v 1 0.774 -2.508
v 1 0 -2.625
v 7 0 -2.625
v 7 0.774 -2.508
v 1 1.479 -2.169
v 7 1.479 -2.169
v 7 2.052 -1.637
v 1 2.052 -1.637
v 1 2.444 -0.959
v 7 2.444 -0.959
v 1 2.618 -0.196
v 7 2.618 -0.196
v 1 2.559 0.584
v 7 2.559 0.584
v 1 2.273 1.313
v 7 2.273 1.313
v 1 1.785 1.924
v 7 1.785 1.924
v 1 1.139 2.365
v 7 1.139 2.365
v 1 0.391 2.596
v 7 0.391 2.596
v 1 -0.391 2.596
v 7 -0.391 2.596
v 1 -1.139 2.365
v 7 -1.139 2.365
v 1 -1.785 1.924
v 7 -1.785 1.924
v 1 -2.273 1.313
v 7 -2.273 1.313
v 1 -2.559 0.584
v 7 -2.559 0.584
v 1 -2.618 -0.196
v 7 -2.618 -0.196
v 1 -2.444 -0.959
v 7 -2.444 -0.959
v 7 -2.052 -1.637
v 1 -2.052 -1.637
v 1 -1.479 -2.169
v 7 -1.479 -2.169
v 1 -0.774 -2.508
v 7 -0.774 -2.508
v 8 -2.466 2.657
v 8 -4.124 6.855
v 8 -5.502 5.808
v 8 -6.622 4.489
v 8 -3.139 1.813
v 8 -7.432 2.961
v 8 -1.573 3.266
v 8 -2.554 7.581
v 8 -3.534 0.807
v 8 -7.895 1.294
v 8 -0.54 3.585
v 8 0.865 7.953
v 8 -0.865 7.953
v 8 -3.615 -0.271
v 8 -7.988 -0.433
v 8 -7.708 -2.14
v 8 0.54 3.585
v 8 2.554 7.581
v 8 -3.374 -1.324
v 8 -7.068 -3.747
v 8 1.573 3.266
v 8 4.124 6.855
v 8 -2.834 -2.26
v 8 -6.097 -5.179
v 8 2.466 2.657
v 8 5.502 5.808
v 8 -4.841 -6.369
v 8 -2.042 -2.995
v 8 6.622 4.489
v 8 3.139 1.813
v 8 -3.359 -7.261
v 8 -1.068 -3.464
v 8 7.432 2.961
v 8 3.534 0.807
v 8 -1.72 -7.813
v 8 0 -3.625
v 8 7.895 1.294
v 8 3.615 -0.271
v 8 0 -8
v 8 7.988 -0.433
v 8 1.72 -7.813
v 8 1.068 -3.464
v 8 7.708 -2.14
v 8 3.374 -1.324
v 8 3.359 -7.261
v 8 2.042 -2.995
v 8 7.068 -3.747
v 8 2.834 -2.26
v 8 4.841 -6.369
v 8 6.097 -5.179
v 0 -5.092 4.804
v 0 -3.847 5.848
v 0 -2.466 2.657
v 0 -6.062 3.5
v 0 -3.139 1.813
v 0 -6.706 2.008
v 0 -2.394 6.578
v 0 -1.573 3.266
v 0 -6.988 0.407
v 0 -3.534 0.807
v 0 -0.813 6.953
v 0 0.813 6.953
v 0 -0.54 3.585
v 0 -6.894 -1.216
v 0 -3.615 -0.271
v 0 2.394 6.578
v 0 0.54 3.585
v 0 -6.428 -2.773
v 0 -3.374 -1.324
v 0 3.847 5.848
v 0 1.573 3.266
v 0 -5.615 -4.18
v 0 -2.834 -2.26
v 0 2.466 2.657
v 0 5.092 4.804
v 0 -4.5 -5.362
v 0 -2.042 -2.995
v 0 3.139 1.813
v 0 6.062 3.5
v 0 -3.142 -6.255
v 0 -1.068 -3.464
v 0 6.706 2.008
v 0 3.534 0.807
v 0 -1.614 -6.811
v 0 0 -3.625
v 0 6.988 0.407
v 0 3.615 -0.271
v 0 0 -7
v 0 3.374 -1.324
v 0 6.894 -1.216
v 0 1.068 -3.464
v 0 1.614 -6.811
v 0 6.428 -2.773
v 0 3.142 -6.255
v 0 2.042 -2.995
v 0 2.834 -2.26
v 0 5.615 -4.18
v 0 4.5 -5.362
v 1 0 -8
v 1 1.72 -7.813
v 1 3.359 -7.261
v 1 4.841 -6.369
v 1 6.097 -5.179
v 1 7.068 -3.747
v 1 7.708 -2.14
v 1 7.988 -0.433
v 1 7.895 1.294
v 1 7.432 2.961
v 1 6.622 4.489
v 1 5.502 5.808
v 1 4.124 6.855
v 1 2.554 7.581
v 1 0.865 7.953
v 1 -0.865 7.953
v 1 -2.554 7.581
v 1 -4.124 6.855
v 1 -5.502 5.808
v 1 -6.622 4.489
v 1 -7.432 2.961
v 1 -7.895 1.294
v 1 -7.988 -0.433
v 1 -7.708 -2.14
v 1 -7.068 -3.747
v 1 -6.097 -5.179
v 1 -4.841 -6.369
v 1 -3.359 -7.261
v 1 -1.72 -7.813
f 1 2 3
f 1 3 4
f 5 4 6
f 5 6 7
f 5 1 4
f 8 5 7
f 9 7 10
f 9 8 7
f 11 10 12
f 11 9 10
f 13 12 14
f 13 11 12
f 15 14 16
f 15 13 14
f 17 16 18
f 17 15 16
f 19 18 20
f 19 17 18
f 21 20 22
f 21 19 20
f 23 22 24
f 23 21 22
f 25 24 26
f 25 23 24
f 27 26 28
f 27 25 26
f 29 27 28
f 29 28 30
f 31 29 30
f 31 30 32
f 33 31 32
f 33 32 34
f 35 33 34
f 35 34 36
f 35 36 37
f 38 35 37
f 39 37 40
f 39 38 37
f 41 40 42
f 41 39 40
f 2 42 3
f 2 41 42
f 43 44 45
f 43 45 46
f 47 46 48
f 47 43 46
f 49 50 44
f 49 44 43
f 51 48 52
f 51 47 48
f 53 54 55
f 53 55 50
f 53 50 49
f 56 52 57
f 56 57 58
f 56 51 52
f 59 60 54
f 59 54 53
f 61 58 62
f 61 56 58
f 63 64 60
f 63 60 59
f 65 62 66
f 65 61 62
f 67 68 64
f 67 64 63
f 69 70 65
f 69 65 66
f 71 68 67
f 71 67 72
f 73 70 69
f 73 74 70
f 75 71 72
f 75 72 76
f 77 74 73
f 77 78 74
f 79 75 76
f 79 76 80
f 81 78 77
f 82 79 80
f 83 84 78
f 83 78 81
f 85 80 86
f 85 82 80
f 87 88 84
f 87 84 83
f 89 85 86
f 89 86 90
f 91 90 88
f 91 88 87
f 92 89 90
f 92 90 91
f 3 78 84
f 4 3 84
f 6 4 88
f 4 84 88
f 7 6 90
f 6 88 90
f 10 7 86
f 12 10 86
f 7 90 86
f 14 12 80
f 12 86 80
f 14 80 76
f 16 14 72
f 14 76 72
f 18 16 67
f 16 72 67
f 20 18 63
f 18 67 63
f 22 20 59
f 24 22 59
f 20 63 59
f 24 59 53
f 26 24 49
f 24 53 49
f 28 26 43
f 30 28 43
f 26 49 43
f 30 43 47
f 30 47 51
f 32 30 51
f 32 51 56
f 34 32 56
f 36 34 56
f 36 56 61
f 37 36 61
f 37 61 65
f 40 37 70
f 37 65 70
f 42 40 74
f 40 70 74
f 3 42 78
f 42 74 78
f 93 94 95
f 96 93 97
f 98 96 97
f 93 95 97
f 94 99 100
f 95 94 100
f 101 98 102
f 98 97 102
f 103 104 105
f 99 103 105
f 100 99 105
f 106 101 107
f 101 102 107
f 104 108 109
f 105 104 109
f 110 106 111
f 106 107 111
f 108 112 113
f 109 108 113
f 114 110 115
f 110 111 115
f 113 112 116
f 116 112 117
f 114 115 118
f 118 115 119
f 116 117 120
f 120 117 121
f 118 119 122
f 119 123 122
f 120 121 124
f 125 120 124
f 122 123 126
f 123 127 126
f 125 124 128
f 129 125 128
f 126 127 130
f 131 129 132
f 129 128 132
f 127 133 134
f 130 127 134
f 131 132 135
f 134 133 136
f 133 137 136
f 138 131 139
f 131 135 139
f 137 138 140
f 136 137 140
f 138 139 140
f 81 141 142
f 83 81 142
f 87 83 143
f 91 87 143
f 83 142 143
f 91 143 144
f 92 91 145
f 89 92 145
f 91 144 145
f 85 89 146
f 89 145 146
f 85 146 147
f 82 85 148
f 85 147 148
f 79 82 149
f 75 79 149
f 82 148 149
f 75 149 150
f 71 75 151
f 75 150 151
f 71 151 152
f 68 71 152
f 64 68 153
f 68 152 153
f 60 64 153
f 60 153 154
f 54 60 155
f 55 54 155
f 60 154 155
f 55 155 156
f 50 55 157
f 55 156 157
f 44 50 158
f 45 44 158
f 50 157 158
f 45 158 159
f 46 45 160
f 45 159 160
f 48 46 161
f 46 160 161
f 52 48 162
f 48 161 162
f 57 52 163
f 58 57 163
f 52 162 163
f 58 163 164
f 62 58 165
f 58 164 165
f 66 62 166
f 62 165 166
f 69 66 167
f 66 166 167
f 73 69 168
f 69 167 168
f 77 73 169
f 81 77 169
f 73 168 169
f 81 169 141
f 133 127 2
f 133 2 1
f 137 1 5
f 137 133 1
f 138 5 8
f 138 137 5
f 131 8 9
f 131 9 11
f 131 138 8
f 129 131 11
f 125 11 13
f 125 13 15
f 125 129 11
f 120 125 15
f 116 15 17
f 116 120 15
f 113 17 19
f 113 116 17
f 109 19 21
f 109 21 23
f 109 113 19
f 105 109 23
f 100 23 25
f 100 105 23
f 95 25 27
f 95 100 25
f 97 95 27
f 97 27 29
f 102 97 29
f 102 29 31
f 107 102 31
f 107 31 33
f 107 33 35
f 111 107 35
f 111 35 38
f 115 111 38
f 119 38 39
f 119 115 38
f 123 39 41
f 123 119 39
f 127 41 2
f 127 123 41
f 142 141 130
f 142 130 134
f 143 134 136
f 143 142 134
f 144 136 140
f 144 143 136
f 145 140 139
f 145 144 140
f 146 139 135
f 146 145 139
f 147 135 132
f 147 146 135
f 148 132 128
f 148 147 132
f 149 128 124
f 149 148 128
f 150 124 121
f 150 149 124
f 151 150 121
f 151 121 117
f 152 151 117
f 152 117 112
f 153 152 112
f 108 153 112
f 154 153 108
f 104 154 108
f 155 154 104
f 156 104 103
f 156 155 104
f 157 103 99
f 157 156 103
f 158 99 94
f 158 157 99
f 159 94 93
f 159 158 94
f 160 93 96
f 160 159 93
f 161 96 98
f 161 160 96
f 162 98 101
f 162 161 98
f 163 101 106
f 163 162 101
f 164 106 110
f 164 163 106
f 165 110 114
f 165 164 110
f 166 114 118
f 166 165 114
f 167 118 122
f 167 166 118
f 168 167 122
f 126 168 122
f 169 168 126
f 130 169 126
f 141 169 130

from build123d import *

# Parameters (mm, degrees)
SKETCH1_R           = 8
SKETCH1_R_2         = 2.625
BOSS_EXTRUDE1_DEPTH = 8
CHAMFER2_SIZE       = 1
CHAMFER3_SIZE       = 1


with BuildPart() as part:
    # Sketch1 → Boss-Extrude1 (new body)
    with BuildSketch(Plane(origin=(0, 0, 0), x_dir=(0, 0, -1), z_dir=(1, 0, 0))):
        Circle(SKETCH1_R)
        Circle(SKETCH1_R_2, mode=Mode.SUBTRACT)
    extrude(amount=BOSS_EXTRUDE1_DEPTH)

    # Chamfer2
    chamfer2_edges = [part.edges().sort_by_distance(p)[0] for p in [
        (0, 0, 2.625),
        (8, 0, 2.625),
    ]]
    chamfer(chamfer2_edges, length=CHAMFER2_SIZE)

    # Chamfer3
    chamfer3_edges = [part.edges().sort_by_distance(p)[0] for p in [
        (0, 0, 8),
    ]]
    chamfer(chamfer3_edges, length=CHAMFER3_SIZE)


solid = part.part
